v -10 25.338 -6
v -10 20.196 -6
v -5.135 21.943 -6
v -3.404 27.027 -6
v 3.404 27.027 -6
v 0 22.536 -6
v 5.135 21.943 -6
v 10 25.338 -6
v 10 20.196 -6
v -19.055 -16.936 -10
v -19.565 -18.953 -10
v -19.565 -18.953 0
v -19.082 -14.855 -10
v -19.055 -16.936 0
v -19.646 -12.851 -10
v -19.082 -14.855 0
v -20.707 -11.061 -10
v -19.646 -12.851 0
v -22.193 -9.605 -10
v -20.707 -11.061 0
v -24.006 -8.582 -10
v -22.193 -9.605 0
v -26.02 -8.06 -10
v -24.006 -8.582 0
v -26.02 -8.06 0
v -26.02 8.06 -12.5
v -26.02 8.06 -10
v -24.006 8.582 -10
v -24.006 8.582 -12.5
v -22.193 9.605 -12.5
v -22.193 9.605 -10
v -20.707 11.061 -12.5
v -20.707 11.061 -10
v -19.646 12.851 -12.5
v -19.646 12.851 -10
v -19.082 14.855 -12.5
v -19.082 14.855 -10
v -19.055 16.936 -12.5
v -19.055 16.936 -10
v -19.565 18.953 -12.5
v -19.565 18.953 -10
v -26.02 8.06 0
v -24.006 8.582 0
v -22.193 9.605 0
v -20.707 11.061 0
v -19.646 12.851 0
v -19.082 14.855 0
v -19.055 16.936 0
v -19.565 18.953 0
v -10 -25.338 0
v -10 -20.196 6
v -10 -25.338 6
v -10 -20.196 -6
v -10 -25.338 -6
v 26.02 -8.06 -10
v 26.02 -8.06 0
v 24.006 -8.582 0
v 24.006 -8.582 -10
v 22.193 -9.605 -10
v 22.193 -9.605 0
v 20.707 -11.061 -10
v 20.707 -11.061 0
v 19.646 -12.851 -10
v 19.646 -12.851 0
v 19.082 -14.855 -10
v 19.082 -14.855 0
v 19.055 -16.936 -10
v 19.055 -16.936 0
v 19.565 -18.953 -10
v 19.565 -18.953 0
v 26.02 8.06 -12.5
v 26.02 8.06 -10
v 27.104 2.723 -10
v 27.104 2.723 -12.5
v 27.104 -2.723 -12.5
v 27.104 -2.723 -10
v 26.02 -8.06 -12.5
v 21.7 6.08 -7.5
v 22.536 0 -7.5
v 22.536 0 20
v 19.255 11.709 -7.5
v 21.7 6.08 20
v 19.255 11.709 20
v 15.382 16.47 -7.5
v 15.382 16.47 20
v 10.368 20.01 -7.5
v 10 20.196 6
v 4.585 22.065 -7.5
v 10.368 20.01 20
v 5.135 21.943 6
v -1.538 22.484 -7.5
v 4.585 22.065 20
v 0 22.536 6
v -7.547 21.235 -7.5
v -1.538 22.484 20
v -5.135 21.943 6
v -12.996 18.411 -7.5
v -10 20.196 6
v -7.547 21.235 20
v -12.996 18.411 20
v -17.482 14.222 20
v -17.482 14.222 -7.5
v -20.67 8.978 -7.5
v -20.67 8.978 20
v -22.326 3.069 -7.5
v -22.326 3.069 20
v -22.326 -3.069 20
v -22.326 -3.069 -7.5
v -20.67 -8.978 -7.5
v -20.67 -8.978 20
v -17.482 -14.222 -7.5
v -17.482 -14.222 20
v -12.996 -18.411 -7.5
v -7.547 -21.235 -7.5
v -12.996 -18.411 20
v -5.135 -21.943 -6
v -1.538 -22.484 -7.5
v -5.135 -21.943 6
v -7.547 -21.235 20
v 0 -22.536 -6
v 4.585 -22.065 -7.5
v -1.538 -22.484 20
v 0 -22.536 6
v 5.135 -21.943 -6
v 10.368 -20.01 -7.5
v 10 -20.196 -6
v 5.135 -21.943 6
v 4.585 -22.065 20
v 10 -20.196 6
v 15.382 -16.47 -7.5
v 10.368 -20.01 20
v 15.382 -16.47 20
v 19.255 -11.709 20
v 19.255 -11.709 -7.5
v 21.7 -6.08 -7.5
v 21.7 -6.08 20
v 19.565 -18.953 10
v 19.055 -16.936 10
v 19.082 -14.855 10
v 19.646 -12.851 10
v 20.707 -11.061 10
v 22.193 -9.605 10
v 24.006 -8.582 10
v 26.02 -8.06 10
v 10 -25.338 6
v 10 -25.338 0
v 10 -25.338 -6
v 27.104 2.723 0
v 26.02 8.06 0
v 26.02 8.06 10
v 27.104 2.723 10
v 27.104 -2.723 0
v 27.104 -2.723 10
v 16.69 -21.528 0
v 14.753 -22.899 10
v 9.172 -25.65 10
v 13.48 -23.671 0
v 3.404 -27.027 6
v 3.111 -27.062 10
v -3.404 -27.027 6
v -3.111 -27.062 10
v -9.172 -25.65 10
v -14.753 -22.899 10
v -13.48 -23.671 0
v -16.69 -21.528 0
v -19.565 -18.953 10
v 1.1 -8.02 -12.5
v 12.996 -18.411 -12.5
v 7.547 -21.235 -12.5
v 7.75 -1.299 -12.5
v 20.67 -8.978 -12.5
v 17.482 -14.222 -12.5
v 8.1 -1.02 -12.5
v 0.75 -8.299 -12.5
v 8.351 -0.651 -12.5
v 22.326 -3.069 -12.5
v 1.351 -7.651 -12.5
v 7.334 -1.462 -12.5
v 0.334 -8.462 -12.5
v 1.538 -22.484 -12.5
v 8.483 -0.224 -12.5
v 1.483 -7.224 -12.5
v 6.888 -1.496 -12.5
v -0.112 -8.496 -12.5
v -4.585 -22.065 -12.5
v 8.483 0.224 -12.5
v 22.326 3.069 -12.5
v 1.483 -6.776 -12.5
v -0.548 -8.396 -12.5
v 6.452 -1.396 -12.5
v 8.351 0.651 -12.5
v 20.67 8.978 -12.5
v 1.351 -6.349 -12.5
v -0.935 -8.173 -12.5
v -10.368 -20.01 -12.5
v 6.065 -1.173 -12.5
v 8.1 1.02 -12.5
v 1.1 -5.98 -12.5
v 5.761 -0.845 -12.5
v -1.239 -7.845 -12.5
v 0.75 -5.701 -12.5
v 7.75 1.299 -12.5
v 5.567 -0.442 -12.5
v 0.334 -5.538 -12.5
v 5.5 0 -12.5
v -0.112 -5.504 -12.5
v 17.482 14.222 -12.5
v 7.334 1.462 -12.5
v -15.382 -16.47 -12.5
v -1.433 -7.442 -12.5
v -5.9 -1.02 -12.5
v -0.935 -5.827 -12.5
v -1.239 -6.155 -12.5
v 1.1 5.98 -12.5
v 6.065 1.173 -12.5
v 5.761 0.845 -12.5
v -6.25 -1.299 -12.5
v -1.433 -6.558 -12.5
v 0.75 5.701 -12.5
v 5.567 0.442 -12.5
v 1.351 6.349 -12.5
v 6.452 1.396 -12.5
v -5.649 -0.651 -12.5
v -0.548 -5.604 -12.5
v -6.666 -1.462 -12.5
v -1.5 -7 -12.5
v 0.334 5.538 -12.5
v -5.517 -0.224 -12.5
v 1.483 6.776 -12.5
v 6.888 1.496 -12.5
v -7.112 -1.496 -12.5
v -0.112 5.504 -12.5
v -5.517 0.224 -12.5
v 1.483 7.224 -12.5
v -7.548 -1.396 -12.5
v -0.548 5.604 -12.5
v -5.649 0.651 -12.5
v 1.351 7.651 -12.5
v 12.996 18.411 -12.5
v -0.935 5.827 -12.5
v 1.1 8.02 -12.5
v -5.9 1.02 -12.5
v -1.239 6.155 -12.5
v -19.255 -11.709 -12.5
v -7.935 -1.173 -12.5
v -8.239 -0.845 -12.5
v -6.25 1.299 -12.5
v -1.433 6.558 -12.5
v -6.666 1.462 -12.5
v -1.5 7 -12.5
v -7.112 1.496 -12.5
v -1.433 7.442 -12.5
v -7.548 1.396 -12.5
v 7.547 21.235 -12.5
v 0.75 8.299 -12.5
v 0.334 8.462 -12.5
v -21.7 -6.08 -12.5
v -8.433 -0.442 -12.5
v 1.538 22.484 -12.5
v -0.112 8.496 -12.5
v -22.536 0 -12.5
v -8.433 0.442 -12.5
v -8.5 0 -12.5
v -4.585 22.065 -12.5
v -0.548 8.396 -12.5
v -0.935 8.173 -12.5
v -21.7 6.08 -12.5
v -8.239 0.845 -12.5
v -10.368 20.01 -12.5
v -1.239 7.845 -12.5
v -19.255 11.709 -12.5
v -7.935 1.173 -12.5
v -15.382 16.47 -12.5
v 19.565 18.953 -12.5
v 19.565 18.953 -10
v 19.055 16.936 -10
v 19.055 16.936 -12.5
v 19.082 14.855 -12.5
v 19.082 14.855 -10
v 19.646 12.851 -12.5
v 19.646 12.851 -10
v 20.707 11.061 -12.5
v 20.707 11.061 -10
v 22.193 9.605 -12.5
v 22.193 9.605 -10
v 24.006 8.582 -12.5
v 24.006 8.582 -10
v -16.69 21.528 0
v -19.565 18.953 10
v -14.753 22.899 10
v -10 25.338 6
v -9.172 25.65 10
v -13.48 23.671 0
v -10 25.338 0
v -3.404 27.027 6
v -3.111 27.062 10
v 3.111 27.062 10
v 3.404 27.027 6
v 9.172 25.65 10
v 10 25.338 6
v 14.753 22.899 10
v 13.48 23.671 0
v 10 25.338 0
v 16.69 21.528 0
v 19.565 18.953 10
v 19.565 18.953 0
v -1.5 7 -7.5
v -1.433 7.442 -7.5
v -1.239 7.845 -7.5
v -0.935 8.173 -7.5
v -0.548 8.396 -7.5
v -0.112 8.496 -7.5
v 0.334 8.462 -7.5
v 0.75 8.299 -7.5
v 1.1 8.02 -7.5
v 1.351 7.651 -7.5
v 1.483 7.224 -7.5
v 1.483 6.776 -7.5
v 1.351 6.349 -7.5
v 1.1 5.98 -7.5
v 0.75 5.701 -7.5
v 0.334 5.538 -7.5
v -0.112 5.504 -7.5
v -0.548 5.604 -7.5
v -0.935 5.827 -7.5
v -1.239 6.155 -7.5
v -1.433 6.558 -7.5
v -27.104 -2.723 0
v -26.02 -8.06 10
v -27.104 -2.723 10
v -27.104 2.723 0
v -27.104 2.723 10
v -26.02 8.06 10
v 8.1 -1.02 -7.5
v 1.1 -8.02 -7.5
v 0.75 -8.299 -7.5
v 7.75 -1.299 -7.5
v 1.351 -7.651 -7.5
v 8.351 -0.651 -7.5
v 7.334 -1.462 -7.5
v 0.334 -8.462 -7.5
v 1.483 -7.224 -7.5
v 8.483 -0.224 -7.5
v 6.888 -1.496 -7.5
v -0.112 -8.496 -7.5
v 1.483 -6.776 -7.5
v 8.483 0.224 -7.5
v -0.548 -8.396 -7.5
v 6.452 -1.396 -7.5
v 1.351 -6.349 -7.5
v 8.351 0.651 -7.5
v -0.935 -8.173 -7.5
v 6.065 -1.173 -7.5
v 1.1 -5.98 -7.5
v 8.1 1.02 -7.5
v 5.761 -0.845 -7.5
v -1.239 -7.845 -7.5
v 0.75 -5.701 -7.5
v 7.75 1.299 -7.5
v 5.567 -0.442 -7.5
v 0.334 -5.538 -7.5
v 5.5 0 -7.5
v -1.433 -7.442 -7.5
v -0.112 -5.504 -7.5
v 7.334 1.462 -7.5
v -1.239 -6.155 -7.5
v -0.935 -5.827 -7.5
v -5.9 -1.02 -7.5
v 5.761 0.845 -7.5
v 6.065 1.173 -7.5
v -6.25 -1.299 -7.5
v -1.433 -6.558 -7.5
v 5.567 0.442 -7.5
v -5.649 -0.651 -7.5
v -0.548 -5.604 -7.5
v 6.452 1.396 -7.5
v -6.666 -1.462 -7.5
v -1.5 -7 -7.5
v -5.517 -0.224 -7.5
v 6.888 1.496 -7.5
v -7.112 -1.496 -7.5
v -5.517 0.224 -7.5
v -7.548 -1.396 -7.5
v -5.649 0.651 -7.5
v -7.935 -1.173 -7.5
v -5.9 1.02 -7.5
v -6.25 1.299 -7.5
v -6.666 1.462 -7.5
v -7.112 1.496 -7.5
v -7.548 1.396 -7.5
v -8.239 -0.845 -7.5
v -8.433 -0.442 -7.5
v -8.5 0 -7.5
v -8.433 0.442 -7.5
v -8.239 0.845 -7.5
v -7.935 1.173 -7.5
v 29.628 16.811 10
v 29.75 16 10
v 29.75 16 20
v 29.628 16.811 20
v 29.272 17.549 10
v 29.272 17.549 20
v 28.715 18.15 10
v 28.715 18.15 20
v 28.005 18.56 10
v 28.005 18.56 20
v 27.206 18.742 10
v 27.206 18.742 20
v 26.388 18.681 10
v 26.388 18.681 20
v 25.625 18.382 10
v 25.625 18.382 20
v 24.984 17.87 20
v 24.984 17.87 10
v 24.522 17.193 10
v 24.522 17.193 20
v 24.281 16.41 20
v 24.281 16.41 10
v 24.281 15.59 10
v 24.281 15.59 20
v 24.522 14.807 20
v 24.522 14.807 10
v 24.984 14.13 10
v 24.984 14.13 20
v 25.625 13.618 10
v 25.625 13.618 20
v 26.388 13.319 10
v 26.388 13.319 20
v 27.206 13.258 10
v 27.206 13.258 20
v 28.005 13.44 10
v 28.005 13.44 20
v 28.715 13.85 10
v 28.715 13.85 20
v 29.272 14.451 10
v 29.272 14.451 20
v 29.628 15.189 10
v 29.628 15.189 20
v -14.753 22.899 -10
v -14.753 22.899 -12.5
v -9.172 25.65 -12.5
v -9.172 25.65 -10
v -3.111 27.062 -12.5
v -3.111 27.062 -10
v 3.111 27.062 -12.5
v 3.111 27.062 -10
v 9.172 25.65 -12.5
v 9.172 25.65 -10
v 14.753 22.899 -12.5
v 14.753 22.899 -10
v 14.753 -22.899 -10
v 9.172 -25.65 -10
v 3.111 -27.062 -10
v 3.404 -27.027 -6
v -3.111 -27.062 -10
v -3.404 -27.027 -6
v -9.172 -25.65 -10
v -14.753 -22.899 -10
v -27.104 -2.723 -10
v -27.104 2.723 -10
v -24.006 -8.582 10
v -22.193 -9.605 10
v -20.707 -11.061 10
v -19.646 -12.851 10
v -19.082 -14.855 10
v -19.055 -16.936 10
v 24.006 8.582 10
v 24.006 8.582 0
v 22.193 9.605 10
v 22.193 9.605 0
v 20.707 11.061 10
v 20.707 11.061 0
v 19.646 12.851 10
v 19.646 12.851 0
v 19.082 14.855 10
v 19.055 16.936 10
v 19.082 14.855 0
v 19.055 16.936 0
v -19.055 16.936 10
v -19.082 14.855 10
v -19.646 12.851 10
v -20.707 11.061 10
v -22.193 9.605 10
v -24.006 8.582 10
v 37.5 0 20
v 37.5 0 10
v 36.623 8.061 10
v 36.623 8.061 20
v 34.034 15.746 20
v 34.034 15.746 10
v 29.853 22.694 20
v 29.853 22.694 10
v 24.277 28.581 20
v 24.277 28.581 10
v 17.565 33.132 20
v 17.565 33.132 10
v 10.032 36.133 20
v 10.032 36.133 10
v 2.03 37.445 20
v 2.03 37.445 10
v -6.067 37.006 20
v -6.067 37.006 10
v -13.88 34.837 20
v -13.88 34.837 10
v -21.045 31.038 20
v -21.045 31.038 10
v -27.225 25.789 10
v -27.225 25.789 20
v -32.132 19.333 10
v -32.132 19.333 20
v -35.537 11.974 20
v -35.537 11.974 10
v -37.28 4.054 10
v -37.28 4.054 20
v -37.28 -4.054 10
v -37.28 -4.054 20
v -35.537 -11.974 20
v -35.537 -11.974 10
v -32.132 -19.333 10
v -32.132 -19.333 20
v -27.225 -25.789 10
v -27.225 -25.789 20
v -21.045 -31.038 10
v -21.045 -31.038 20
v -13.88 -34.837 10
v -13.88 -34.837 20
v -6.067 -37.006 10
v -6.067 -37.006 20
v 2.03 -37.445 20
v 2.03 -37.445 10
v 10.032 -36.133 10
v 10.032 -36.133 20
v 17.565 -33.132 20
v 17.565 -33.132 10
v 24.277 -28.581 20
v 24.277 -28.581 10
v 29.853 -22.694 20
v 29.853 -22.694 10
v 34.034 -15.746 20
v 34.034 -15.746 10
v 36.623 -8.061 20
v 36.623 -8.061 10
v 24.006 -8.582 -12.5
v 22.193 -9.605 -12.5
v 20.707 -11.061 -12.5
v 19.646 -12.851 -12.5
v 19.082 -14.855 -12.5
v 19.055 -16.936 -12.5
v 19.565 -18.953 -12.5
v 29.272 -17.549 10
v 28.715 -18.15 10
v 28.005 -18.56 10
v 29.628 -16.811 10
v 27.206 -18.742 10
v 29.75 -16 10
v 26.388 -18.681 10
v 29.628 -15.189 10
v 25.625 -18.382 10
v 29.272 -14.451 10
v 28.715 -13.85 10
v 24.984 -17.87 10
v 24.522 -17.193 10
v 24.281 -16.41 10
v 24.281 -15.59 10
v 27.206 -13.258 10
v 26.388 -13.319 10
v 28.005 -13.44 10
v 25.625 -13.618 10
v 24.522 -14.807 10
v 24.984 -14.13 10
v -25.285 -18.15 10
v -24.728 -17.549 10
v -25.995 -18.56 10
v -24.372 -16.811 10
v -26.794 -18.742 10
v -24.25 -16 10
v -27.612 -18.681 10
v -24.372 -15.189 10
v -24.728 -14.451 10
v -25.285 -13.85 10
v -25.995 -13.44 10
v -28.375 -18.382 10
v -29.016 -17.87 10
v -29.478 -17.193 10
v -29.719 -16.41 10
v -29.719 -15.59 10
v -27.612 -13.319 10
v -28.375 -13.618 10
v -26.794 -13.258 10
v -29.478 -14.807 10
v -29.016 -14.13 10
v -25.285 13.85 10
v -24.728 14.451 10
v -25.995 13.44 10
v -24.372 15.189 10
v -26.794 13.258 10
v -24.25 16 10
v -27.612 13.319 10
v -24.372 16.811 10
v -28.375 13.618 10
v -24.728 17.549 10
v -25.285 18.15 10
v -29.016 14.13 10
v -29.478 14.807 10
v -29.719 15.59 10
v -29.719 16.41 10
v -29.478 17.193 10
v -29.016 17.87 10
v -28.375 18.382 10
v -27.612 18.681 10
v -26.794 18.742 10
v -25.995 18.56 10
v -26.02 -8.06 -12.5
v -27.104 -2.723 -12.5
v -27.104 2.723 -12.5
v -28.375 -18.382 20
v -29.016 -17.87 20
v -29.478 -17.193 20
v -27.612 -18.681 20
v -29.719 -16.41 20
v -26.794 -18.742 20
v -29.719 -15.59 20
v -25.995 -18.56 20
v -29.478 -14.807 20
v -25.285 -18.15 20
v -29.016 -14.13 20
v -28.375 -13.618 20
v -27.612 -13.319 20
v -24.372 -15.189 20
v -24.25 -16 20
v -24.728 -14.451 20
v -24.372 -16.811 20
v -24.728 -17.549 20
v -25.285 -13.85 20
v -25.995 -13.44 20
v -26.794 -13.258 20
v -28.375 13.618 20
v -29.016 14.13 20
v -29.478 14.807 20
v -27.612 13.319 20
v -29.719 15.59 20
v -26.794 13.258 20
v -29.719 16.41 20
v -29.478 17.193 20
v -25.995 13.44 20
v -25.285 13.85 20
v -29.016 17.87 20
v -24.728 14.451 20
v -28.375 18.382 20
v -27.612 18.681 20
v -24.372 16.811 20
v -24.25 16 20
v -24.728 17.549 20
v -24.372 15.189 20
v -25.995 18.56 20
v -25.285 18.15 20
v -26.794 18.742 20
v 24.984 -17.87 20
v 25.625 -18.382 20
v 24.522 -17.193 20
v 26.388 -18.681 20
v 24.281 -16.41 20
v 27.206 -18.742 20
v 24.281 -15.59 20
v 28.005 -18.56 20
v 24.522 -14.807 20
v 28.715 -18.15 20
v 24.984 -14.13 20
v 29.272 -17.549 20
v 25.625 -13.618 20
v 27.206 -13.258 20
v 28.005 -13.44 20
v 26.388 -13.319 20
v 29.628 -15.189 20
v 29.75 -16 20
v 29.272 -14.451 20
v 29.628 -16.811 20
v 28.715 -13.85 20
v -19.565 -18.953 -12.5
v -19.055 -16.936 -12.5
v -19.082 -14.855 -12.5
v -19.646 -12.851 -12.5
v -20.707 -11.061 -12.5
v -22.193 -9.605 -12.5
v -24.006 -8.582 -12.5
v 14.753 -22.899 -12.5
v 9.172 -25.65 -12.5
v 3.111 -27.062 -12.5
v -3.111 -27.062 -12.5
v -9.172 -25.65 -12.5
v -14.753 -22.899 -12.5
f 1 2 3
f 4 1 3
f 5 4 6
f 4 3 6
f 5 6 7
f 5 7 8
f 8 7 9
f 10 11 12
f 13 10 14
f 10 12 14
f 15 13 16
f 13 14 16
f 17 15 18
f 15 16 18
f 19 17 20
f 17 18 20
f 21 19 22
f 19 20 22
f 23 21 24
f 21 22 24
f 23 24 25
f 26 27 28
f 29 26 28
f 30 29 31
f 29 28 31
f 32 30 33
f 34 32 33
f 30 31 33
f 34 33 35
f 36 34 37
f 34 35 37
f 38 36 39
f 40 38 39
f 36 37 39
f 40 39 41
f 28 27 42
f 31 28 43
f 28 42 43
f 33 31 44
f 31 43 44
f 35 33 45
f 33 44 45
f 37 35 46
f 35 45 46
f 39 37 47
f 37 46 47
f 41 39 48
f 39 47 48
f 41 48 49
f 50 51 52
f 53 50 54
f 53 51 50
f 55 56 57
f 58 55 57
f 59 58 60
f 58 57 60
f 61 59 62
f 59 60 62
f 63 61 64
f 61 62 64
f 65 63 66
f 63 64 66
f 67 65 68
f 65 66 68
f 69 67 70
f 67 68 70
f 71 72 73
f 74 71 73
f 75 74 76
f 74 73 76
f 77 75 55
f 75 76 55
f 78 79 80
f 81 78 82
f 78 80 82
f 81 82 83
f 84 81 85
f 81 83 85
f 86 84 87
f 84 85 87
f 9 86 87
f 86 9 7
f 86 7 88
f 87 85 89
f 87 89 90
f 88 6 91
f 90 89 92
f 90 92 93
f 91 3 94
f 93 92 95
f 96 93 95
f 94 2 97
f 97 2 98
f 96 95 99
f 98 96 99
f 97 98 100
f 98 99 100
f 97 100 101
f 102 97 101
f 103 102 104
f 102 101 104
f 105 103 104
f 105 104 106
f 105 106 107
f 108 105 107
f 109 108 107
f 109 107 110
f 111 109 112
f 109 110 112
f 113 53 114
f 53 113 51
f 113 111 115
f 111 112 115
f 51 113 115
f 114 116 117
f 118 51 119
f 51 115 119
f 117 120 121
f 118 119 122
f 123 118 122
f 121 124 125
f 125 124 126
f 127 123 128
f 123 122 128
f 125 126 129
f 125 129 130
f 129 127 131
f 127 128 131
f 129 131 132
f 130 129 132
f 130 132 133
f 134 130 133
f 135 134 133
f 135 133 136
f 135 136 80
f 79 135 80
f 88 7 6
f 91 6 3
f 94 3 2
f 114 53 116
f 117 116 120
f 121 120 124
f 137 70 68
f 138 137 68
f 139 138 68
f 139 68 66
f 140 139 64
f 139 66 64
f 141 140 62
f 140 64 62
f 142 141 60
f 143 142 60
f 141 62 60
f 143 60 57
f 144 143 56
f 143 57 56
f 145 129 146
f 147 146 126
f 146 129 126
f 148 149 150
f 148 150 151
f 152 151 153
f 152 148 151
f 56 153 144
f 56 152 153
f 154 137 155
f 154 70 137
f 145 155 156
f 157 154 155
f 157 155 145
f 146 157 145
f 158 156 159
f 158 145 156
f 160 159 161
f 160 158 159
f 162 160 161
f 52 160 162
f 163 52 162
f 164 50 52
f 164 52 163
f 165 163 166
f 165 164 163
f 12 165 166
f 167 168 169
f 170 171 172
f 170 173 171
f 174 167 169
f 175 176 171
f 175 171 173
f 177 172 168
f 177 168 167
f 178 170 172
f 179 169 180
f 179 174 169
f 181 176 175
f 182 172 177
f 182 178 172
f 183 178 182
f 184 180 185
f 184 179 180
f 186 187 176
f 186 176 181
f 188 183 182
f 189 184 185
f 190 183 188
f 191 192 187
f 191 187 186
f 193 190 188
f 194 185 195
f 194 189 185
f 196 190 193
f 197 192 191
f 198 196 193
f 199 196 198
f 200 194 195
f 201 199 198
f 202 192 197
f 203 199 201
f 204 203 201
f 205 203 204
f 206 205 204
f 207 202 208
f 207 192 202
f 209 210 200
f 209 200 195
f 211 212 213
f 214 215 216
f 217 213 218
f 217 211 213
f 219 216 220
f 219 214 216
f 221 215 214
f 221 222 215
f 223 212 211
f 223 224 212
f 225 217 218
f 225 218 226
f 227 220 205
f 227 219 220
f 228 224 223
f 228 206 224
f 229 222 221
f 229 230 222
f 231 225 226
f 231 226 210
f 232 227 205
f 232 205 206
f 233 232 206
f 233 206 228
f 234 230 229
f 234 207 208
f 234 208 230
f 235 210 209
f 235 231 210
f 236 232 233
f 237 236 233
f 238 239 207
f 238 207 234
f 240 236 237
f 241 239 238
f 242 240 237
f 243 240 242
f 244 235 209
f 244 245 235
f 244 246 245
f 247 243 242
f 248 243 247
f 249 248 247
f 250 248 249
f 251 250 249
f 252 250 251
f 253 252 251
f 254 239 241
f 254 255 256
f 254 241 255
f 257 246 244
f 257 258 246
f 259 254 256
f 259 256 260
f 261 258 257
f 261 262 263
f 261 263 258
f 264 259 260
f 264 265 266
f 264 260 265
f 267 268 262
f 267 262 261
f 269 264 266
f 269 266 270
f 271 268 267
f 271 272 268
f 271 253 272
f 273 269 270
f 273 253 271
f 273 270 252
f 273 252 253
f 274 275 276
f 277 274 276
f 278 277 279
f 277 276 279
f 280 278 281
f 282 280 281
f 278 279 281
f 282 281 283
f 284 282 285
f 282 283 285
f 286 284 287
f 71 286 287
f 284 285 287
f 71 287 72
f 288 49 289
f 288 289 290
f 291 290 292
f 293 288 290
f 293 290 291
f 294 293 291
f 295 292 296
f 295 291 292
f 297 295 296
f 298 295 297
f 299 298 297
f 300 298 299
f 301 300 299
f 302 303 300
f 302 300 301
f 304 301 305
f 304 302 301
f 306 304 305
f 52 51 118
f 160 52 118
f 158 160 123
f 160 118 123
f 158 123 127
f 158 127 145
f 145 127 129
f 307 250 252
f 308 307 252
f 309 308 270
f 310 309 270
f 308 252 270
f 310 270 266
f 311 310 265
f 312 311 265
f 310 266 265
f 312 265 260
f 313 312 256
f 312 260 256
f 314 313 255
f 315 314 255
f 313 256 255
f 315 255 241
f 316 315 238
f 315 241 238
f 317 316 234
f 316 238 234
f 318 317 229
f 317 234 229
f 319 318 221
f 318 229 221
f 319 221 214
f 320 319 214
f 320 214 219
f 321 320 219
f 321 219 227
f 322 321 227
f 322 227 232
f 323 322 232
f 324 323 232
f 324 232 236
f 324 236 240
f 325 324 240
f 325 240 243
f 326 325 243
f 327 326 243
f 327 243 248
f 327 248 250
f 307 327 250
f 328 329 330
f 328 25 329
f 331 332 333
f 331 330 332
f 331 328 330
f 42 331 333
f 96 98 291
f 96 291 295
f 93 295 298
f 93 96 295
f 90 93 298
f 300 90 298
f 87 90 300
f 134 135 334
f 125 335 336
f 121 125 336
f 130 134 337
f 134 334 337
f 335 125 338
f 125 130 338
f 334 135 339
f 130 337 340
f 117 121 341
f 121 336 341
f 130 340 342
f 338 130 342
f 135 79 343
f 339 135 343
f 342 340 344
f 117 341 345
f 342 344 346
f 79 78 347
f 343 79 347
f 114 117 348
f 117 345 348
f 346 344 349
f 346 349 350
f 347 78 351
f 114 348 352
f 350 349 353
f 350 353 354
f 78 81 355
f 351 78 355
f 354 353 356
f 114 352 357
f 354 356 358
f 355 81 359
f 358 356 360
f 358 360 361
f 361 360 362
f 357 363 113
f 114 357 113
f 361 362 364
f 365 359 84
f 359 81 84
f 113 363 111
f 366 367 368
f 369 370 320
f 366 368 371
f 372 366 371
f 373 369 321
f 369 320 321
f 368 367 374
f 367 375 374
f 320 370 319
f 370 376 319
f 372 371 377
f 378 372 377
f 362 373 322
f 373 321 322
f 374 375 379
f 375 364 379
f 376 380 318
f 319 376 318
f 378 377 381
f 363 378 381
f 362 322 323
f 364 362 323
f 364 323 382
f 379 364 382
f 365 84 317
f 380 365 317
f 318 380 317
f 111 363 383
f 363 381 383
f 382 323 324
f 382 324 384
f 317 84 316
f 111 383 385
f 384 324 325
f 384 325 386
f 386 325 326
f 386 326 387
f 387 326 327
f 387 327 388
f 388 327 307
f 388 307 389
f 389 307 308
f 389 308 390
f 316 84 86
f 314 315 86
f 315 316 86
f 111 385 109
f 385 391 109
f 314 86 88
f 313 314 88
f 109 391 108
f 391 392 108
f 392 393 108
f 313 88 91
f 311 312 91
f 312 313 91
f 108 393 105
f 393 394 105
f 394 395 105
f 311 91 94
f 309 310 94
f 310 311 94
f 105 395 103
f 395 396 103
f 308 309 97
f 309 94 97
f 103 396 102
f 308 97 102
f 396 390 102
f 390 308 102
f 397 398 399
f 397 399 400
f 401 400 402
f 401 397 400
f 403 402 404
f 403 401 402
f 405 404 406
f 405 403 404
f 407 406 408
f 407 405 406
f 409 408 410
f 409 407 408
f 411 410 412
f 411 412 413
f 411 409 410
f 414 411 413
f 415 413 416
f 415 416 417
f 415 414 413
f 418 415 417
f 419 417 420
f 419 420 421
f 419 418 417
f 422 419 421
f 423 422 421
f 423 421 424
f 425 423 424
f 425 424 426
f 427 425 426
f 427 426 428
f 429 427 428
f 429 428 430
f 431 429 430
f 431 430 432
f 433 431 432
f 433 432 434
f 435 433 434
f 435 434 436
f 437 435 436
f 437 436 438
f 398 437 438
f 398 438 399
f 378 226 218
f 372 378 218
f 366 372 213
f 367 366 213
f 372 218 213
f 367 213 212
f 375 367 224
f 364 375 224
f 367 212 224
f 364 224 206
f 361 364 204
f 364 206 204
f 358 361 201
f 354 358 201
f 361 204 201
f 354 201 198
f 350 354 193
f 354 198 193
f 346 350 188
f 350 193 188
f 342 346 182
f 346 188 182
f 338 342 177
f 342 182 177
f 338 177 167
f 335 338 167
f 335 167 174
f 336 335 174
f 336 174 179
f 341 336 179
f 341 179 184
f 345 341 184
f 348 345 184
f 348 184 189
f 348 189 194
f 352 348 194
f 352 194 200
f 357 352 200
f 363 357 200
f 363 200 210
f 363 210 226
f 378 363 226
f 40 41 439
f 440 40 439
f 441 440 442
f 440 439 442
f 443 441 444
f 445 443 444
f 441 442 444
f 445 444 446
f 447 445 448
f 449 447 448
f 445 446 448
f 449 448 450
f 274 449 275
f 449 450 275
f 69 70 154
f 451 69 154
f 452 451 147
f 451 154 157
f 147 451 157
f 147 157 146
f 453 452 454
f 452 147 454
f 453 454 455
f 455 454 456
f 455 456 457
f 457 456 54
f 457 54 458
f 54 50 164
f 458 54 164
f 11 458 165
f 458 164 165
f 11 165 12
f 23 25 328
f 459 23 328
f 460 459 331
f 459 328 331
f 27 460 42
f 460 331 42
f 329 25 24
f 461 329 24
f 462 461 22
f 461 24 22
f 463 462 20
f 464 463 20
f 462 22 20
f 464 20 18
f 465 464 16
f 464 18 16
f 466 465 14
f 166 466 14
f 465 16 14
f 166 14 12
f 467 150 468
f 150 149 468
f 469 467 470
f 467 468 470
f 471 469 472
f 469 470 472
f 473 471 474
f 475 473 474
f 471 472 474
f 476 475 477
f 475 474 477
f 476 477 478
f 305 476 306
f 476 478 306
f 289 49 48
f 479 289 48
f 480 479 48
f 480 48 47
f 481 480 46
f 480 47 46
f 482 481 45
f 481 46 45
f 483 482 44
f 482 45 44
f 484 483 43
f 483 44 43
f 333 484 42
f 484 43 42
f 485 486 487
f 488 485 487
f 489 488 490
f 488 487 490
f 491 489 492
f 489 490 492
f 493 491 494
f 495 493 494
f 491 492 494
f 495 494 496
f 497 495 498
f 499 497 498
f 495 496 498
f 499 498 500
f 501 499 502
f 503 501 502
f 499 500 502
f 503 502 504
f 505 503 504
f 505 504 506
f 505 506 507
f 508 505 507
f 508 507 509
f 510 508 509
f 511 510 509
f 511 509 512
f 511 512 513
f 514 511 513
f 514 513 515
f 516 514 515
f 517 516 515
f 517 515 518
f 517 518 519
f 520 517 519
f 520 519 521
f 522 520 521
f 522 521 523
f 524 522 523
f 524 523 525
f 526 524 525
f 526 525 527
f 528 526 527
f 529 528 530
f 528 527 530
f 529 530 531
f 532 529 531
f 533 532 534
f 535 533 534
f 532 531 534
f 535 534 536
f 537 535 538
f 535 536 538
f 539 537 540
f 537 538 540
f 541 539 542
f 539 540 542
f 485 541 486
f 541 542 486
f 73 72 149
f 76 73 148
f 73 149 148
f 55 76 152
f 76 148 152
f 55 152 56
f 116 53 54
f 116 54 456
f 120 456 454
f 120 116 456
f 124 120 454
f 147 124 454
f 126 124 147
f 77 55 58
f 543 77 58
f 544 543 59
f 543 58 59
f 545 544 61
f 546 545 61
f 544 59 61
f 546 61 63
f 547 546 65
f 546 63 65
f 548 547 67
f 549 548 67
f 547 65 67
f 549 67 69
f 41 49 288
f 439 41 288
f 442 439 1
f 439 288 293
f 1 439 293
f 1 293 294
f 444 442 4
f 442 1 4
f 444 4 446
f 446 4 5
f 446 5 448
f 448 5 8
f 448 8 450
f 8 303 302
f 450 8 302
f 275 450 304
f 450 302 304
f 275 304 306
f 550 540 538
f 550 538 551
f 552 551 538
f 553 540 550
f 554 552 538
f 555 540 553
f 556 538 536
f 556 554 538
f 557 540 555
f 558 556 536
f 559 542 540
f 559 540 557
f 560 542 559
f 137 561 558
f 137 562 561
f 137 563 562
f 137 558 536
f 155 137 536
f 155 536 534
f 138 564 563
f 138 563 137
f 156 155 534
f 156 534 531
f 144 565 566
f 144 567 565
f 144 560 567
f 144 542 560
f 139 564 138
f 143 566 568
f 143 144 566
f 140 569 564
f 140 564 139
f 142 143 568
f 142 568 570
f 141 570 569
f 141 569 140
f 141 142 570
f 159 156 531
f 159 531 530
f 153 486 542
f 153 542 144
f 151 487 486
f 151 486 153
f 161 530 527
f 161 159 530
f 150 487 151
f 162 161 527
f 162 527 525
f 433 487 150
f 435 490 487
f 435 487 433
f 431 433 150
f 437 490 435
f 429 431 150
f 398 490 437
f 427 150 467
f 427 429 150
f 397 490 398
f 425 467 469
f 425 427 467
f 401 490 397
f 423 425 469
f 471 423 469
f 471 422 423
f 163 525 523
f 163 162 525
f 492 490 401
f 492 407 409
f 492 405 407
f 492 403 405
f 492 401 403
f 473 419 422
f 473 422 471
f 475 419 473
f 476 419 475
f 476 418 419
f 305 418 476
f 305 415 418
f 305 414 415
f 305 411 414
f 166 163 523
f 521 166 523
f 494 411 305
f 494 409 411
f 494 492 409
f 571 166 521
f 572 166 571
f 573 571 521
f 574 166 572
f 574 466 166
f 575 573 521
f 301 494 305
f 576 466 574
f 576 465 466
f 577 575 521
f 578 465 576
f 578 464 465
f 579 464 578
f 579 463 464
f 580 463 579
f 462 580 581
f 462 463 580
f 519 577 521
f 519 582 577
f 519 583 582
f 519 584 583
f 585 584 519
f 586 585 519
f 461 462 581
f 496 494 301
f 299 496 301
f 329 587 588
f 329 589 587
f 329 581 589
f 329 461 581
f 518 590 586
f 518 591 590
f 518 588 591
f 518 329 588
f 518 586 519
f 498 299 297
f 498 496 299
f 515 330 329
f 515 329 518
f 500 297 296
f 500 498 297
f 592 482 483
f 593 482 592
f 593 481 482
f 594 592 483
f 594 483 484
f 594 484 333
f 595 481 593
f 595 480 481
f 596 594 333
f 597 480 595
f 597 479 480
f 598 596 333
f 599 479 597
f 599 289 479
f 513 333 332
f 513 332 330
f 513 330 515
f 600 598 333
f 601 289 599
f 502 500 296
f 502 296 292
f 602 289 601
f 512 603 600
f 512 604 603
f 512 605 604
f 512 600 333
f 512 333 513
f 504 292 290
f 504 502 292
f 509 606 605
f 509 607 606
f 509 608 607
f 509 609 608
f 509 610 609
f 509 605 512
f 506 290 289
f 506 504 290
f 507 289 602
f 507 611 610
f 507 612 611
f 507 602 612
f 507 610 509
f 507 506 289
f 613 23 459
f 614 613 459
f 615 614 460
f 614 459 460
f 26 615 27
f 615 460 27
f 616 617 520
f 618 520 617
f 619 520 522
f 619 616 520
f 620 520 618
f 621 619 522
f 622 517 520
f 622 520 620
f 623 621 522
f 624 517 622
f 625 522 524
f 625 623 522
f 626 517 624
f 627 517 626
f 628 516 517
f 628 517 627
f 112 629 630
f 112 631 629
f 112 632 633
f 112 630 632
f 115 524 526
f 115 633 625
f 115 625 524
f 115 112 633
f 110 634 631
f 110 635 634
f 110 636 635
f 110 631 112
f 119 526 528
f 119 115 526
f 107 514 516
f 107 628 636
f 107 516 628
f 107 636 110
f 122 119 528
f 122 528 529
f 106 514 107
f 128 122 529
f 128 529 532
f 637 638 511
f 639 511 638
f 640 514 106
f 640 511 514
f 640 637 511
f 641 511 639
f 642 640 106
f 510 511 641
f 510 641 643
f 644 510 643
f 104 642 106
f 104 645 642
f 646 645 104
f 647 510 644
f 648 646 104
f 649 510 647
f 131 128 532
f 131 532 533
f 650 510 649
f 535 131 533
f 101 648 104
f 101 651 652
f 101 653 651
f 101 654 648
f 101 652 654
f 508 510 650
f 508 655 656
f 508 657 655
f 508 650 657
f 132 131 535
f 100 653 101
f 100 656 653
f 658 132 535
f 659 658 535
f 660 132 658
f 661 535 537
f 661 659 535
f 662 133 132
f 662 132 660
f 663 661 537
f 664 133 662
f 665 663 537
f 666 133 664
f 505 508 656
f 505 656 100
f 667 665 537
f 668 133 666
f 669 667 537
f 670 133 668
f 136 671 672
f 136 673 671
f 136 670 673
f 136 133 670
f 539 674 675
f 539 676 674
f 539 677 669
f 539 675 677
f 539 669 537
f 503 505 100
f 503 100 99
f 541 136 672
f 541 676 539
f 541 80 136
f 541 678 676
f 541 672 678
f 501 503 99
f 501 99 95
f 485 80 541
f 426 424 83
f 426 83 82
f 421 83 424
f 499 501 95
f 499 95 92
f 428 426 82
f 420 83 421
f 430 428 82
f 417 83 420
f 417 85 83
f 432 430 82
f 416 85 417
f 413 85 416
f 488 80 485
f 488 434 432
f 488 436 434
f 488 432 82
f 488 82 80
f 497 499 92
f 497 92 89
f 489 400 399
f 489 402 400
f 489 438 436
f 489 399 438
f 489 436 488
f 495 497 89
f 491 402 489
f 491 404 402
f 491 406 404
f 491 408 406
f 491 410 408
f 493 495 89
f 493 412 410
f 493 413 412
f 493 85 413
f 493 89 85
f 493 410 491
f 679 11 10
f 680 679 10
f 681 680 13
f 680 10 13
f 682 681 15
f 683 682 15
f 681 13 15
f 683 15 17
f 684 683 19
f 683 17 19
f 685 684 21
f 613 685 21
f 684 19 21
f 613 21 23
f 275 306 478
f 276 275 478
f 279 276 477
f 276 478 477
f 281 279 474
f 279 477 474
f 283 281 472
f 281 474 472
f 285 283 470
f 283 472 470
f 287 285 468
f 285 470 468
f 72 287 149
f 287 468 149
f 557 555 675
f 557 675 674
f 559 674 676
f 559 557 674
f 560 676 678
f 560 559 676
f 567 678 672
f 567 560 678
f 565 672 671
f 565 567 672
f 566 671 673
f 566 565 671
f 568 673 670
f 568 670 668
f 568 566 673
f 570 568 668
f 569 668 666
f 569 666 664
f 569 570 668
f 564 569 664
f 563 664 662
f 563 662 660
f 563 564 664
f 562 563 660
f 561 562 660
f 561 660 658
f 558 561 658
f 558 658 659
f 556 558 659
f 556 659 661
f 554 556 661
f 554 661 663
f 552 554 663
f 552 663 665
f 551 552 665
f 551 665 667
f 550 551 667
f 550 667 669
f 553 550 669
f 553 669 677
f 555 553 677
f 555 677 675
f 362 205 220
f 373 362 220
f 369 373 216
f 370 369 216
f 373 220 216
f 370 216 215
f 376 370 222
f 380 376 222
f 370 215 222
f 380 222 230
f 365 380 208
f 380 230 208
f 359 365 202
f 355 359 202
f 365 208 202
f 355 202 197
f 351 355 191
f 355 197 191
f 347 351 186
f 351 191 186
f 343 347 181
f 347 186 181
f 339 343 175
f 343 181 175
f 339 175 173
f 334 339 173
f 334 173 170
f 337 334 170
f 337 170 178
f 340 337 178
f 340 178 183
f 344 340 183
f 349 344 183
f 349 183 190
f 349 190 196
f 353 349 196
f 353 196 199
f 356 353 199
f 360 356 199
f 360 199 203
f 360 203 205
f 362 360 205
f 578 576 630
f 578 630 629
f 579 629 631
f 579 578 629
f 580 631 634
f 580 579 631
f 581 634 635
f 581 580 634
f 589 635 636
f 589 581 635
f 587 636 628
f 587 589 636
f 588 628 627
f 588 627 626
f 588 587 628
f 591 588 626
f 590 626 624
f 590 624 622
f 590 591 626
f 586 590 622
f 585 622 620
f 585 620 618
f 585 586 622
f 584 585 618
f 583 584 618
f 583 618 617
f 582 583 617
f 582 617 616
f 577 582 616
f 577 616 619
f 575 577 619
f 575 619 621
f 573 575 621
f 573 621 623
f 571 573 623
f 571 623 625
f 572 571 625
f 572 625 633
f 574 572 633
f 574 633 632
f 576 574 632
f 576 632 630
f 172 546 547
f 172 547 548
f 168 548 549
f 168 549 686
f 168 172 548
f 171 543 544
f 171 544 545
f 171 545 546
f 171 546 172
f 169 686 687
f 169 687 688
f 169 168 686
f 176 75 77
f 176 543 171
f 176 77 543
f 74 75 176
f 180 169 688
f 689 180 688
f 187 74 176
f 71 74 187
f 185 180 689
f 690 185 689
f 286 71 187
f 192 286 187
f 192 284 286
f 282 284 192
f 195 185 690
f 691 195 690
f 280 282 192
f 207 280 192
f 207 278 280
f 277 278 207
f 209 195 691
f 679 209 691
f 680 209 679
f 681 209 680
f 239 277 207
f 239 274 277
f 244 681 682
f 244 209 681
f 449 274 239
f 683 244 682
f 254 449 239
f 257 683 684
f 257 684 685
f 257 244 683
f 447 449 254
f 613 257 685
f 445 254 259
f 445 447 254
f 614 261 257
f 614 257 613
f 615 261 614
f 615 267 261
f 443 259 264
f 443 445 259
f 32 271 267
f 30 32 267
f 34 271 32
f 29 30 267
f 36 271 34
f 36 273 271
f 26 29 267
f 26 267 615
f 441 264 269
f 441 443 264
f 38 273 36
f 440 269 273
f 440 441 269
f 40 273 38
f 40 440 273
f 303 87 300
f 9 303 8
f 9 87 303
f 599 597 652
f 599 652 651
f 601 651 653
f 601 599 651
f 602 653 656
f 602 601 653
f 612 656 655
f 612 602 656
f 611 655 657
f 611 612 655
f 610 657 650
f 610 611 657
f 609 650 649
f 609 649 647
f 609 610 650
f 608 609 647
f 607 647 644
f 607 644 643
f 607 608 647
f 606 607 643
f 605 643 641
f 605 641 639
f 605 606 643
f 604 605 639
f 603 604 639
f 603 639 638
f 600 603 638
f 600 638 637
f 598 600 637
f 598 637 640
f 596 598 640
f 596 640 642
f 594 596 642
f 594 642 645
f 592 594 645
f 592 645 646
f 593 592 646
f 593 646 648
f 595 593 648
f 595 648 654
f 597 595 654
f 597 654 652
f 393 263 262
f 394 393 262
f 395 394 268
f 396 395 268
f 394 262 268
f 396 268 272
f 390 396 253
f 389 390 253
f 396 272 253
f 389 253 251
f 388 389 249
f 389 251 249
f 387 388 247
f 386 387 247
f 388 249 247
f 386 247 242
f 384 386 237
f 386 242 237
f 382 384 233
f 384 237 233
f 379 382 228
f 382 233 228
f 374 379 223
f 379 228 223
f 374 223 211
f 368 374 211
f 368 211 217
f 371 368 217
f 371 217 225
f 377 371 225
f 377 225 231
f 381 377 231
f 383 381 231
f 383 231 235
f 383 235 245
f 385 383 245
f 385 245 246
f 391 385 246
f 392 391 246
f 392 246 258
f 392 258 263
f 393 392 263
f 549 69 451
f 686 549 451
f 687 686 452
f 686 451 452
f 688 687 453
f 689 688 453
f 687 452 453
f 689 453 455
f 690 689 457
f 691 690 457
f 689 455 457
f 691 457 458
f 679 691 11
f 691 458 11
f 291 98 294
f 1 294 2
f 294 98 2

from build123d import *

# Parameters (mm, degrees)
SKETCH_1_R               = 37.5
SKETCH_1_R_2             = 2.75
EXTRUDE_1_DEPTH          = 20
SKETCH_2_R               = 22.536189363
CUT_EXTRUDE_1_DEPTH      = 12
SKETCH_8_R               = 37.5
SKETCH_8_R_2             = 27.240226037
CUT_EXTRUDE_4_DEPTH      = 10
SKETCH_9_R               = 8
CUT_EXTRUDE_5_DEPTH      = 10
EXTRUDE_2_DEPTH          = 10
SKETCH_11_R              = 45
EXTRUDE_3_DEPTH          = 5
SKETCH_13_R              = 1.5
CUT_EXTRUDE_6_DEPTH      = 10
SKETCH_14_R              = 22.536189363
CUT_EXTRUDE_7_DEPTH      = 24
SKETCH_15_W              = 20
SKETCH_15_H              = 12
CUT_EXTRUDE_8_DEPTH      = 46
CUT_EXTRUDE_8_DEPTH_BACK = 46
SKETCH_17_R              = 45
CUT_EXTRUDE_11_DEPTH     = 10
SKETCH_19_R              = 22.536189363
EXTRUDE_4_DEPTH          = 2.5
EXTRUDE_4_DEPTH_BACK     = 2.5
SKETCH_21_R              = 1.5
CUT_EXTRUDE_12_DEPTH     = 33.5
SKETCH_22_R              = 22.536189363
EXTRUDE_6_DEPTH          = 2.5


with BuildPart() as part:
    # 草图1 → 凸台-拉伸1 (new body)
    with BuildSketch(Plane.XY):
        Circle(SKETCH_1_R)
        with Locations((-27, 16)):
            Circle(SKETCH_1_R_2, mode=Mode.SUBTRACT)
        with Locations((27, 16)):
            Circle(SKETCH_1_R_2, mode=Mode.SUBTRACT)
        with Locations((-27, -16)):
            Circle(SKETCH_1_R_2, mode=Mode.SUBTRACT)
        with Locations((27, -16)):
            Circle(SKETCH_1_R_2, mode=Mode.SUBTRACT)
    extrude(amount=EXTRUDE_1_DEPTH)

    # 草图2 → 切除-拉伸1 (cut)
    with BuildSketch(Plane.XY.offset(20)):
        Circle(SKETCH_2_R)
    extrude(amount=-CUT_EXTRUDE_1_DEPTH, mode=Mode.SUBTRACT)

    # 草图8 → 切除-拉伸4 (cut)
    with BuildSketch(Plane(origin=(0, 0, 0), x_dir=(-1, 0, 0), z_dir=(0, 0, -1))):
        Circle(SKETCH_8_R)
        Circle(SKETCH_8_R_2, mode=Mode.SUBTRACT)
    extrude(amount=-CUT_EXTRUDE_4_DEPTH, mode=Mode.SUBTRACT)

    # 草图9 → 切除-拉伸5 (cut)
    with BuildSketch(Plane(origin=(0, 0, 0), x_dir=(-1, 0, 0), z_dir=(0, 0, -1))):
        with Locations((-27, 16)):
            Circle(SKETCH_9_R)
        with Locations((27, 16)):
            Circle(SKETCH_9_R)
        with Locations((-27, -16)):
            Circle(SKETCH_9_R)
        with Locations((27, -16)):
            Circle(SKETCH_9_R)
    extrude(amount=-CUT_EXTRUDE_5_DEPTH, mode=Mode.SUBTRACT)

    # 草图10 → 凸台-拉伸2 (add)
    with BuildSketch(Plane(origin=(0, 0, 0), x_dir=(-1, 0, 0), z_dir=(0, 0, -1))):
        with BuildLine():
            ThreePointArc((-19.565154934, -18.95348588), (0, -27.240226037), (19.565154934, -18.95348588))
            ThreePointArc((19.565154934, -18.95348588), (20.117667731, -11.921580878), (26.020436633, -8.060198012))
            ThreePointArc((26.020436633, -8.060198012), (27.240226037, 0), (26.020436633, 8.060198012))
            ThreePointArc((26.020436633, 8.060198012), (20.117667731, 11.921580878), (19.565154934, 18.95348588))
            ThreePointArc((19.565154934, 18.95348588), (0, 27.240226037), (-19.565154934, 18.95348588))
            ThreePointArc((-19.565154934, 18.95348588), (-20.117667731, 11.921580878), (-26.020436633, 8.060198012))
            ThreePointArc((-26.020436633, 8.060198012), (-27.240226037, 0), (-26.020436633, -8.060198012))
            ThreePointArc((-26.020436633, -8.060198012), (-20.117667731, -11.921580878), (-19.565154934, -18.95348588))
        make_face()
    extrude(amount=EXTRUDE_2_DEPTH)

    # 草图11 → 凸台-拉伸3 (add)
    with BuildSketch(Plane(origin=(0, 0, -10), x_dir=(-1, 0, 0), z_dir=(0, 0, -1))):
        Circle(SKETCH_11_R)
    extrude(amount=EXTRUDE_3_DEPTH)

    # 草图13 → 切除-拉伸6 (cut)
    with BuildSketch(Plane(origin=(0, 0, -15), x_dir=(-1, 0, 0), z_dir=(0, 0, -1))):
        with Locations((0, 36.415999231)):
            Circle(SKETCH_13_R)
        with Locations((-36.415999231, 0)):
            Circle(SKETCH_13_R)
        with Locations((0, -36.415999231)):
            Circle(SKETCH_13_R)
        with Locations((36.415999231, 0)):
            Circle(SKETCH_13_R)
    extrude(amount=-CUT_EXTRUDE_6_DEPTH, mode=Mode.SUBTRACT)

    # 草图14 → 切除-拉伸7 (cut, through all)
    with BuildSketch(Plane.XY.offset(8)):
        Circle(SKETCH_14_R)
    extrude(amount=-CUT_EXTRUDE_7_DEPTH, mode=Mode.SUBTRACT)

    # 草图15 → 切除-拉伸8 (cut, two sides)
    with BuildSketch(Plane(origin=(0, 0, 0), x_dir=(1, 0, 0), z_dir=(0, 1, 0))) as cut_extrude_8_sk:
        Rectangle(SKETCH_15_W, SKETCH_15_H)
    extrude(amount=CUT_EXTRUDE_8_DEPTH, mode=Mode.SUBTRACT)
    extrude(cut_extrude_8_sk.sketch, amount=-CUT_EXTRUDE_8_DEPTH_BACK, mode=Mode.SUBTRACT)

    # 草图17 → 切除-拉伸11 (cut)
    with BuildSketch(Plane.XY.offset(-10)):
        Circle(SKETCH_17_R)
    extrude(amount=-CUT_EXTRUDE_11_DEPTH, mode=Mode.SUBTRACT)

    # 草图19 → 凸台-拉伸4 (add, two sides)
    with BuildSketch(Plane(origin=(0, 0, -10), x_dir=(-1, 0, 0), z_dir=(0, 0, -1))) as extrude_4_sk:
        Circle(SKETCH_19_R)
    extrude(amount=EXTRUDE_4_DEPTH)
    extrude(extrude_4_sk.sketch, amount=-EXTRUDE_4_DEPTH_BACK)

    # 草图21 → 切除-拉伸12 (cut, through all)
    with BuildSketch(Plane(origin=(0, 0, -12.5), x_dir=(-1, 0, 0), z_dir=(0, 0, -1))):
        with Locations((0, 7)):
            Circle(SKETCH_21_R)
        with Locations((-7, 0)):
            Circle(SKETCH_21_R)
        with Locations((7, 0)):
            Circle(SKETCH_21_R)
        with Locations((0, -7)):
            Circle(SKETCH_21_R)
    extrude(amount=-CUT_EXTRUDE_12_DEPTH, mode=Mode.SUBTRACT)

    # 草图22 → 凸台-拉伸6 (add)
    with BuildSketch(Plane(origin=(0, 0, -10), x_dir=(-1, 0, 0), z_dir=(0, 0, -1))):
        with BuildLine():
            ThreePointArc((-26.020436633, 8.060198012), (-27.240226037, 0), (-26.020436633, -8.060198012))
            ThreePointArc((-26.020436633, -8.060198012), (-20.117667731, -11.921580878), (-19.565154934, -18.95348588))
            ThreePointArc((-19.565154934, -18.95348588), (0, -27.240226037), (19.565154934, -18.95348588))
            ThreePointArc((19.565154934, -18.95348588), (20.117667731, -11.921580878), (26.020436633, -8.060198012))
            ThreePointArc((26.020436633, -8.060198012), (27.240226037, 0), (26.020436633, 8.060198012))
            ThreePointArc((26.020436633, 8.060198012), (20.117667731, 11.921580878), (19.565154934, 18.95348588))
            ThreePointArc((19.565154934, 18.95348588), (0, 27.240226037), (-19.565154934, 18.95348588))
            ThreePointArc((-19.565154934, 18.95348588), (-20.117667731, 11.921580878), (-26.020436633, 8.060198012))
        make_face()
        Circle(SKETCH_22_R, mode=Mode.SUBTRACT)
    extrude(amount=EXTRUDE_6_DEPTH)


solid = part.part
